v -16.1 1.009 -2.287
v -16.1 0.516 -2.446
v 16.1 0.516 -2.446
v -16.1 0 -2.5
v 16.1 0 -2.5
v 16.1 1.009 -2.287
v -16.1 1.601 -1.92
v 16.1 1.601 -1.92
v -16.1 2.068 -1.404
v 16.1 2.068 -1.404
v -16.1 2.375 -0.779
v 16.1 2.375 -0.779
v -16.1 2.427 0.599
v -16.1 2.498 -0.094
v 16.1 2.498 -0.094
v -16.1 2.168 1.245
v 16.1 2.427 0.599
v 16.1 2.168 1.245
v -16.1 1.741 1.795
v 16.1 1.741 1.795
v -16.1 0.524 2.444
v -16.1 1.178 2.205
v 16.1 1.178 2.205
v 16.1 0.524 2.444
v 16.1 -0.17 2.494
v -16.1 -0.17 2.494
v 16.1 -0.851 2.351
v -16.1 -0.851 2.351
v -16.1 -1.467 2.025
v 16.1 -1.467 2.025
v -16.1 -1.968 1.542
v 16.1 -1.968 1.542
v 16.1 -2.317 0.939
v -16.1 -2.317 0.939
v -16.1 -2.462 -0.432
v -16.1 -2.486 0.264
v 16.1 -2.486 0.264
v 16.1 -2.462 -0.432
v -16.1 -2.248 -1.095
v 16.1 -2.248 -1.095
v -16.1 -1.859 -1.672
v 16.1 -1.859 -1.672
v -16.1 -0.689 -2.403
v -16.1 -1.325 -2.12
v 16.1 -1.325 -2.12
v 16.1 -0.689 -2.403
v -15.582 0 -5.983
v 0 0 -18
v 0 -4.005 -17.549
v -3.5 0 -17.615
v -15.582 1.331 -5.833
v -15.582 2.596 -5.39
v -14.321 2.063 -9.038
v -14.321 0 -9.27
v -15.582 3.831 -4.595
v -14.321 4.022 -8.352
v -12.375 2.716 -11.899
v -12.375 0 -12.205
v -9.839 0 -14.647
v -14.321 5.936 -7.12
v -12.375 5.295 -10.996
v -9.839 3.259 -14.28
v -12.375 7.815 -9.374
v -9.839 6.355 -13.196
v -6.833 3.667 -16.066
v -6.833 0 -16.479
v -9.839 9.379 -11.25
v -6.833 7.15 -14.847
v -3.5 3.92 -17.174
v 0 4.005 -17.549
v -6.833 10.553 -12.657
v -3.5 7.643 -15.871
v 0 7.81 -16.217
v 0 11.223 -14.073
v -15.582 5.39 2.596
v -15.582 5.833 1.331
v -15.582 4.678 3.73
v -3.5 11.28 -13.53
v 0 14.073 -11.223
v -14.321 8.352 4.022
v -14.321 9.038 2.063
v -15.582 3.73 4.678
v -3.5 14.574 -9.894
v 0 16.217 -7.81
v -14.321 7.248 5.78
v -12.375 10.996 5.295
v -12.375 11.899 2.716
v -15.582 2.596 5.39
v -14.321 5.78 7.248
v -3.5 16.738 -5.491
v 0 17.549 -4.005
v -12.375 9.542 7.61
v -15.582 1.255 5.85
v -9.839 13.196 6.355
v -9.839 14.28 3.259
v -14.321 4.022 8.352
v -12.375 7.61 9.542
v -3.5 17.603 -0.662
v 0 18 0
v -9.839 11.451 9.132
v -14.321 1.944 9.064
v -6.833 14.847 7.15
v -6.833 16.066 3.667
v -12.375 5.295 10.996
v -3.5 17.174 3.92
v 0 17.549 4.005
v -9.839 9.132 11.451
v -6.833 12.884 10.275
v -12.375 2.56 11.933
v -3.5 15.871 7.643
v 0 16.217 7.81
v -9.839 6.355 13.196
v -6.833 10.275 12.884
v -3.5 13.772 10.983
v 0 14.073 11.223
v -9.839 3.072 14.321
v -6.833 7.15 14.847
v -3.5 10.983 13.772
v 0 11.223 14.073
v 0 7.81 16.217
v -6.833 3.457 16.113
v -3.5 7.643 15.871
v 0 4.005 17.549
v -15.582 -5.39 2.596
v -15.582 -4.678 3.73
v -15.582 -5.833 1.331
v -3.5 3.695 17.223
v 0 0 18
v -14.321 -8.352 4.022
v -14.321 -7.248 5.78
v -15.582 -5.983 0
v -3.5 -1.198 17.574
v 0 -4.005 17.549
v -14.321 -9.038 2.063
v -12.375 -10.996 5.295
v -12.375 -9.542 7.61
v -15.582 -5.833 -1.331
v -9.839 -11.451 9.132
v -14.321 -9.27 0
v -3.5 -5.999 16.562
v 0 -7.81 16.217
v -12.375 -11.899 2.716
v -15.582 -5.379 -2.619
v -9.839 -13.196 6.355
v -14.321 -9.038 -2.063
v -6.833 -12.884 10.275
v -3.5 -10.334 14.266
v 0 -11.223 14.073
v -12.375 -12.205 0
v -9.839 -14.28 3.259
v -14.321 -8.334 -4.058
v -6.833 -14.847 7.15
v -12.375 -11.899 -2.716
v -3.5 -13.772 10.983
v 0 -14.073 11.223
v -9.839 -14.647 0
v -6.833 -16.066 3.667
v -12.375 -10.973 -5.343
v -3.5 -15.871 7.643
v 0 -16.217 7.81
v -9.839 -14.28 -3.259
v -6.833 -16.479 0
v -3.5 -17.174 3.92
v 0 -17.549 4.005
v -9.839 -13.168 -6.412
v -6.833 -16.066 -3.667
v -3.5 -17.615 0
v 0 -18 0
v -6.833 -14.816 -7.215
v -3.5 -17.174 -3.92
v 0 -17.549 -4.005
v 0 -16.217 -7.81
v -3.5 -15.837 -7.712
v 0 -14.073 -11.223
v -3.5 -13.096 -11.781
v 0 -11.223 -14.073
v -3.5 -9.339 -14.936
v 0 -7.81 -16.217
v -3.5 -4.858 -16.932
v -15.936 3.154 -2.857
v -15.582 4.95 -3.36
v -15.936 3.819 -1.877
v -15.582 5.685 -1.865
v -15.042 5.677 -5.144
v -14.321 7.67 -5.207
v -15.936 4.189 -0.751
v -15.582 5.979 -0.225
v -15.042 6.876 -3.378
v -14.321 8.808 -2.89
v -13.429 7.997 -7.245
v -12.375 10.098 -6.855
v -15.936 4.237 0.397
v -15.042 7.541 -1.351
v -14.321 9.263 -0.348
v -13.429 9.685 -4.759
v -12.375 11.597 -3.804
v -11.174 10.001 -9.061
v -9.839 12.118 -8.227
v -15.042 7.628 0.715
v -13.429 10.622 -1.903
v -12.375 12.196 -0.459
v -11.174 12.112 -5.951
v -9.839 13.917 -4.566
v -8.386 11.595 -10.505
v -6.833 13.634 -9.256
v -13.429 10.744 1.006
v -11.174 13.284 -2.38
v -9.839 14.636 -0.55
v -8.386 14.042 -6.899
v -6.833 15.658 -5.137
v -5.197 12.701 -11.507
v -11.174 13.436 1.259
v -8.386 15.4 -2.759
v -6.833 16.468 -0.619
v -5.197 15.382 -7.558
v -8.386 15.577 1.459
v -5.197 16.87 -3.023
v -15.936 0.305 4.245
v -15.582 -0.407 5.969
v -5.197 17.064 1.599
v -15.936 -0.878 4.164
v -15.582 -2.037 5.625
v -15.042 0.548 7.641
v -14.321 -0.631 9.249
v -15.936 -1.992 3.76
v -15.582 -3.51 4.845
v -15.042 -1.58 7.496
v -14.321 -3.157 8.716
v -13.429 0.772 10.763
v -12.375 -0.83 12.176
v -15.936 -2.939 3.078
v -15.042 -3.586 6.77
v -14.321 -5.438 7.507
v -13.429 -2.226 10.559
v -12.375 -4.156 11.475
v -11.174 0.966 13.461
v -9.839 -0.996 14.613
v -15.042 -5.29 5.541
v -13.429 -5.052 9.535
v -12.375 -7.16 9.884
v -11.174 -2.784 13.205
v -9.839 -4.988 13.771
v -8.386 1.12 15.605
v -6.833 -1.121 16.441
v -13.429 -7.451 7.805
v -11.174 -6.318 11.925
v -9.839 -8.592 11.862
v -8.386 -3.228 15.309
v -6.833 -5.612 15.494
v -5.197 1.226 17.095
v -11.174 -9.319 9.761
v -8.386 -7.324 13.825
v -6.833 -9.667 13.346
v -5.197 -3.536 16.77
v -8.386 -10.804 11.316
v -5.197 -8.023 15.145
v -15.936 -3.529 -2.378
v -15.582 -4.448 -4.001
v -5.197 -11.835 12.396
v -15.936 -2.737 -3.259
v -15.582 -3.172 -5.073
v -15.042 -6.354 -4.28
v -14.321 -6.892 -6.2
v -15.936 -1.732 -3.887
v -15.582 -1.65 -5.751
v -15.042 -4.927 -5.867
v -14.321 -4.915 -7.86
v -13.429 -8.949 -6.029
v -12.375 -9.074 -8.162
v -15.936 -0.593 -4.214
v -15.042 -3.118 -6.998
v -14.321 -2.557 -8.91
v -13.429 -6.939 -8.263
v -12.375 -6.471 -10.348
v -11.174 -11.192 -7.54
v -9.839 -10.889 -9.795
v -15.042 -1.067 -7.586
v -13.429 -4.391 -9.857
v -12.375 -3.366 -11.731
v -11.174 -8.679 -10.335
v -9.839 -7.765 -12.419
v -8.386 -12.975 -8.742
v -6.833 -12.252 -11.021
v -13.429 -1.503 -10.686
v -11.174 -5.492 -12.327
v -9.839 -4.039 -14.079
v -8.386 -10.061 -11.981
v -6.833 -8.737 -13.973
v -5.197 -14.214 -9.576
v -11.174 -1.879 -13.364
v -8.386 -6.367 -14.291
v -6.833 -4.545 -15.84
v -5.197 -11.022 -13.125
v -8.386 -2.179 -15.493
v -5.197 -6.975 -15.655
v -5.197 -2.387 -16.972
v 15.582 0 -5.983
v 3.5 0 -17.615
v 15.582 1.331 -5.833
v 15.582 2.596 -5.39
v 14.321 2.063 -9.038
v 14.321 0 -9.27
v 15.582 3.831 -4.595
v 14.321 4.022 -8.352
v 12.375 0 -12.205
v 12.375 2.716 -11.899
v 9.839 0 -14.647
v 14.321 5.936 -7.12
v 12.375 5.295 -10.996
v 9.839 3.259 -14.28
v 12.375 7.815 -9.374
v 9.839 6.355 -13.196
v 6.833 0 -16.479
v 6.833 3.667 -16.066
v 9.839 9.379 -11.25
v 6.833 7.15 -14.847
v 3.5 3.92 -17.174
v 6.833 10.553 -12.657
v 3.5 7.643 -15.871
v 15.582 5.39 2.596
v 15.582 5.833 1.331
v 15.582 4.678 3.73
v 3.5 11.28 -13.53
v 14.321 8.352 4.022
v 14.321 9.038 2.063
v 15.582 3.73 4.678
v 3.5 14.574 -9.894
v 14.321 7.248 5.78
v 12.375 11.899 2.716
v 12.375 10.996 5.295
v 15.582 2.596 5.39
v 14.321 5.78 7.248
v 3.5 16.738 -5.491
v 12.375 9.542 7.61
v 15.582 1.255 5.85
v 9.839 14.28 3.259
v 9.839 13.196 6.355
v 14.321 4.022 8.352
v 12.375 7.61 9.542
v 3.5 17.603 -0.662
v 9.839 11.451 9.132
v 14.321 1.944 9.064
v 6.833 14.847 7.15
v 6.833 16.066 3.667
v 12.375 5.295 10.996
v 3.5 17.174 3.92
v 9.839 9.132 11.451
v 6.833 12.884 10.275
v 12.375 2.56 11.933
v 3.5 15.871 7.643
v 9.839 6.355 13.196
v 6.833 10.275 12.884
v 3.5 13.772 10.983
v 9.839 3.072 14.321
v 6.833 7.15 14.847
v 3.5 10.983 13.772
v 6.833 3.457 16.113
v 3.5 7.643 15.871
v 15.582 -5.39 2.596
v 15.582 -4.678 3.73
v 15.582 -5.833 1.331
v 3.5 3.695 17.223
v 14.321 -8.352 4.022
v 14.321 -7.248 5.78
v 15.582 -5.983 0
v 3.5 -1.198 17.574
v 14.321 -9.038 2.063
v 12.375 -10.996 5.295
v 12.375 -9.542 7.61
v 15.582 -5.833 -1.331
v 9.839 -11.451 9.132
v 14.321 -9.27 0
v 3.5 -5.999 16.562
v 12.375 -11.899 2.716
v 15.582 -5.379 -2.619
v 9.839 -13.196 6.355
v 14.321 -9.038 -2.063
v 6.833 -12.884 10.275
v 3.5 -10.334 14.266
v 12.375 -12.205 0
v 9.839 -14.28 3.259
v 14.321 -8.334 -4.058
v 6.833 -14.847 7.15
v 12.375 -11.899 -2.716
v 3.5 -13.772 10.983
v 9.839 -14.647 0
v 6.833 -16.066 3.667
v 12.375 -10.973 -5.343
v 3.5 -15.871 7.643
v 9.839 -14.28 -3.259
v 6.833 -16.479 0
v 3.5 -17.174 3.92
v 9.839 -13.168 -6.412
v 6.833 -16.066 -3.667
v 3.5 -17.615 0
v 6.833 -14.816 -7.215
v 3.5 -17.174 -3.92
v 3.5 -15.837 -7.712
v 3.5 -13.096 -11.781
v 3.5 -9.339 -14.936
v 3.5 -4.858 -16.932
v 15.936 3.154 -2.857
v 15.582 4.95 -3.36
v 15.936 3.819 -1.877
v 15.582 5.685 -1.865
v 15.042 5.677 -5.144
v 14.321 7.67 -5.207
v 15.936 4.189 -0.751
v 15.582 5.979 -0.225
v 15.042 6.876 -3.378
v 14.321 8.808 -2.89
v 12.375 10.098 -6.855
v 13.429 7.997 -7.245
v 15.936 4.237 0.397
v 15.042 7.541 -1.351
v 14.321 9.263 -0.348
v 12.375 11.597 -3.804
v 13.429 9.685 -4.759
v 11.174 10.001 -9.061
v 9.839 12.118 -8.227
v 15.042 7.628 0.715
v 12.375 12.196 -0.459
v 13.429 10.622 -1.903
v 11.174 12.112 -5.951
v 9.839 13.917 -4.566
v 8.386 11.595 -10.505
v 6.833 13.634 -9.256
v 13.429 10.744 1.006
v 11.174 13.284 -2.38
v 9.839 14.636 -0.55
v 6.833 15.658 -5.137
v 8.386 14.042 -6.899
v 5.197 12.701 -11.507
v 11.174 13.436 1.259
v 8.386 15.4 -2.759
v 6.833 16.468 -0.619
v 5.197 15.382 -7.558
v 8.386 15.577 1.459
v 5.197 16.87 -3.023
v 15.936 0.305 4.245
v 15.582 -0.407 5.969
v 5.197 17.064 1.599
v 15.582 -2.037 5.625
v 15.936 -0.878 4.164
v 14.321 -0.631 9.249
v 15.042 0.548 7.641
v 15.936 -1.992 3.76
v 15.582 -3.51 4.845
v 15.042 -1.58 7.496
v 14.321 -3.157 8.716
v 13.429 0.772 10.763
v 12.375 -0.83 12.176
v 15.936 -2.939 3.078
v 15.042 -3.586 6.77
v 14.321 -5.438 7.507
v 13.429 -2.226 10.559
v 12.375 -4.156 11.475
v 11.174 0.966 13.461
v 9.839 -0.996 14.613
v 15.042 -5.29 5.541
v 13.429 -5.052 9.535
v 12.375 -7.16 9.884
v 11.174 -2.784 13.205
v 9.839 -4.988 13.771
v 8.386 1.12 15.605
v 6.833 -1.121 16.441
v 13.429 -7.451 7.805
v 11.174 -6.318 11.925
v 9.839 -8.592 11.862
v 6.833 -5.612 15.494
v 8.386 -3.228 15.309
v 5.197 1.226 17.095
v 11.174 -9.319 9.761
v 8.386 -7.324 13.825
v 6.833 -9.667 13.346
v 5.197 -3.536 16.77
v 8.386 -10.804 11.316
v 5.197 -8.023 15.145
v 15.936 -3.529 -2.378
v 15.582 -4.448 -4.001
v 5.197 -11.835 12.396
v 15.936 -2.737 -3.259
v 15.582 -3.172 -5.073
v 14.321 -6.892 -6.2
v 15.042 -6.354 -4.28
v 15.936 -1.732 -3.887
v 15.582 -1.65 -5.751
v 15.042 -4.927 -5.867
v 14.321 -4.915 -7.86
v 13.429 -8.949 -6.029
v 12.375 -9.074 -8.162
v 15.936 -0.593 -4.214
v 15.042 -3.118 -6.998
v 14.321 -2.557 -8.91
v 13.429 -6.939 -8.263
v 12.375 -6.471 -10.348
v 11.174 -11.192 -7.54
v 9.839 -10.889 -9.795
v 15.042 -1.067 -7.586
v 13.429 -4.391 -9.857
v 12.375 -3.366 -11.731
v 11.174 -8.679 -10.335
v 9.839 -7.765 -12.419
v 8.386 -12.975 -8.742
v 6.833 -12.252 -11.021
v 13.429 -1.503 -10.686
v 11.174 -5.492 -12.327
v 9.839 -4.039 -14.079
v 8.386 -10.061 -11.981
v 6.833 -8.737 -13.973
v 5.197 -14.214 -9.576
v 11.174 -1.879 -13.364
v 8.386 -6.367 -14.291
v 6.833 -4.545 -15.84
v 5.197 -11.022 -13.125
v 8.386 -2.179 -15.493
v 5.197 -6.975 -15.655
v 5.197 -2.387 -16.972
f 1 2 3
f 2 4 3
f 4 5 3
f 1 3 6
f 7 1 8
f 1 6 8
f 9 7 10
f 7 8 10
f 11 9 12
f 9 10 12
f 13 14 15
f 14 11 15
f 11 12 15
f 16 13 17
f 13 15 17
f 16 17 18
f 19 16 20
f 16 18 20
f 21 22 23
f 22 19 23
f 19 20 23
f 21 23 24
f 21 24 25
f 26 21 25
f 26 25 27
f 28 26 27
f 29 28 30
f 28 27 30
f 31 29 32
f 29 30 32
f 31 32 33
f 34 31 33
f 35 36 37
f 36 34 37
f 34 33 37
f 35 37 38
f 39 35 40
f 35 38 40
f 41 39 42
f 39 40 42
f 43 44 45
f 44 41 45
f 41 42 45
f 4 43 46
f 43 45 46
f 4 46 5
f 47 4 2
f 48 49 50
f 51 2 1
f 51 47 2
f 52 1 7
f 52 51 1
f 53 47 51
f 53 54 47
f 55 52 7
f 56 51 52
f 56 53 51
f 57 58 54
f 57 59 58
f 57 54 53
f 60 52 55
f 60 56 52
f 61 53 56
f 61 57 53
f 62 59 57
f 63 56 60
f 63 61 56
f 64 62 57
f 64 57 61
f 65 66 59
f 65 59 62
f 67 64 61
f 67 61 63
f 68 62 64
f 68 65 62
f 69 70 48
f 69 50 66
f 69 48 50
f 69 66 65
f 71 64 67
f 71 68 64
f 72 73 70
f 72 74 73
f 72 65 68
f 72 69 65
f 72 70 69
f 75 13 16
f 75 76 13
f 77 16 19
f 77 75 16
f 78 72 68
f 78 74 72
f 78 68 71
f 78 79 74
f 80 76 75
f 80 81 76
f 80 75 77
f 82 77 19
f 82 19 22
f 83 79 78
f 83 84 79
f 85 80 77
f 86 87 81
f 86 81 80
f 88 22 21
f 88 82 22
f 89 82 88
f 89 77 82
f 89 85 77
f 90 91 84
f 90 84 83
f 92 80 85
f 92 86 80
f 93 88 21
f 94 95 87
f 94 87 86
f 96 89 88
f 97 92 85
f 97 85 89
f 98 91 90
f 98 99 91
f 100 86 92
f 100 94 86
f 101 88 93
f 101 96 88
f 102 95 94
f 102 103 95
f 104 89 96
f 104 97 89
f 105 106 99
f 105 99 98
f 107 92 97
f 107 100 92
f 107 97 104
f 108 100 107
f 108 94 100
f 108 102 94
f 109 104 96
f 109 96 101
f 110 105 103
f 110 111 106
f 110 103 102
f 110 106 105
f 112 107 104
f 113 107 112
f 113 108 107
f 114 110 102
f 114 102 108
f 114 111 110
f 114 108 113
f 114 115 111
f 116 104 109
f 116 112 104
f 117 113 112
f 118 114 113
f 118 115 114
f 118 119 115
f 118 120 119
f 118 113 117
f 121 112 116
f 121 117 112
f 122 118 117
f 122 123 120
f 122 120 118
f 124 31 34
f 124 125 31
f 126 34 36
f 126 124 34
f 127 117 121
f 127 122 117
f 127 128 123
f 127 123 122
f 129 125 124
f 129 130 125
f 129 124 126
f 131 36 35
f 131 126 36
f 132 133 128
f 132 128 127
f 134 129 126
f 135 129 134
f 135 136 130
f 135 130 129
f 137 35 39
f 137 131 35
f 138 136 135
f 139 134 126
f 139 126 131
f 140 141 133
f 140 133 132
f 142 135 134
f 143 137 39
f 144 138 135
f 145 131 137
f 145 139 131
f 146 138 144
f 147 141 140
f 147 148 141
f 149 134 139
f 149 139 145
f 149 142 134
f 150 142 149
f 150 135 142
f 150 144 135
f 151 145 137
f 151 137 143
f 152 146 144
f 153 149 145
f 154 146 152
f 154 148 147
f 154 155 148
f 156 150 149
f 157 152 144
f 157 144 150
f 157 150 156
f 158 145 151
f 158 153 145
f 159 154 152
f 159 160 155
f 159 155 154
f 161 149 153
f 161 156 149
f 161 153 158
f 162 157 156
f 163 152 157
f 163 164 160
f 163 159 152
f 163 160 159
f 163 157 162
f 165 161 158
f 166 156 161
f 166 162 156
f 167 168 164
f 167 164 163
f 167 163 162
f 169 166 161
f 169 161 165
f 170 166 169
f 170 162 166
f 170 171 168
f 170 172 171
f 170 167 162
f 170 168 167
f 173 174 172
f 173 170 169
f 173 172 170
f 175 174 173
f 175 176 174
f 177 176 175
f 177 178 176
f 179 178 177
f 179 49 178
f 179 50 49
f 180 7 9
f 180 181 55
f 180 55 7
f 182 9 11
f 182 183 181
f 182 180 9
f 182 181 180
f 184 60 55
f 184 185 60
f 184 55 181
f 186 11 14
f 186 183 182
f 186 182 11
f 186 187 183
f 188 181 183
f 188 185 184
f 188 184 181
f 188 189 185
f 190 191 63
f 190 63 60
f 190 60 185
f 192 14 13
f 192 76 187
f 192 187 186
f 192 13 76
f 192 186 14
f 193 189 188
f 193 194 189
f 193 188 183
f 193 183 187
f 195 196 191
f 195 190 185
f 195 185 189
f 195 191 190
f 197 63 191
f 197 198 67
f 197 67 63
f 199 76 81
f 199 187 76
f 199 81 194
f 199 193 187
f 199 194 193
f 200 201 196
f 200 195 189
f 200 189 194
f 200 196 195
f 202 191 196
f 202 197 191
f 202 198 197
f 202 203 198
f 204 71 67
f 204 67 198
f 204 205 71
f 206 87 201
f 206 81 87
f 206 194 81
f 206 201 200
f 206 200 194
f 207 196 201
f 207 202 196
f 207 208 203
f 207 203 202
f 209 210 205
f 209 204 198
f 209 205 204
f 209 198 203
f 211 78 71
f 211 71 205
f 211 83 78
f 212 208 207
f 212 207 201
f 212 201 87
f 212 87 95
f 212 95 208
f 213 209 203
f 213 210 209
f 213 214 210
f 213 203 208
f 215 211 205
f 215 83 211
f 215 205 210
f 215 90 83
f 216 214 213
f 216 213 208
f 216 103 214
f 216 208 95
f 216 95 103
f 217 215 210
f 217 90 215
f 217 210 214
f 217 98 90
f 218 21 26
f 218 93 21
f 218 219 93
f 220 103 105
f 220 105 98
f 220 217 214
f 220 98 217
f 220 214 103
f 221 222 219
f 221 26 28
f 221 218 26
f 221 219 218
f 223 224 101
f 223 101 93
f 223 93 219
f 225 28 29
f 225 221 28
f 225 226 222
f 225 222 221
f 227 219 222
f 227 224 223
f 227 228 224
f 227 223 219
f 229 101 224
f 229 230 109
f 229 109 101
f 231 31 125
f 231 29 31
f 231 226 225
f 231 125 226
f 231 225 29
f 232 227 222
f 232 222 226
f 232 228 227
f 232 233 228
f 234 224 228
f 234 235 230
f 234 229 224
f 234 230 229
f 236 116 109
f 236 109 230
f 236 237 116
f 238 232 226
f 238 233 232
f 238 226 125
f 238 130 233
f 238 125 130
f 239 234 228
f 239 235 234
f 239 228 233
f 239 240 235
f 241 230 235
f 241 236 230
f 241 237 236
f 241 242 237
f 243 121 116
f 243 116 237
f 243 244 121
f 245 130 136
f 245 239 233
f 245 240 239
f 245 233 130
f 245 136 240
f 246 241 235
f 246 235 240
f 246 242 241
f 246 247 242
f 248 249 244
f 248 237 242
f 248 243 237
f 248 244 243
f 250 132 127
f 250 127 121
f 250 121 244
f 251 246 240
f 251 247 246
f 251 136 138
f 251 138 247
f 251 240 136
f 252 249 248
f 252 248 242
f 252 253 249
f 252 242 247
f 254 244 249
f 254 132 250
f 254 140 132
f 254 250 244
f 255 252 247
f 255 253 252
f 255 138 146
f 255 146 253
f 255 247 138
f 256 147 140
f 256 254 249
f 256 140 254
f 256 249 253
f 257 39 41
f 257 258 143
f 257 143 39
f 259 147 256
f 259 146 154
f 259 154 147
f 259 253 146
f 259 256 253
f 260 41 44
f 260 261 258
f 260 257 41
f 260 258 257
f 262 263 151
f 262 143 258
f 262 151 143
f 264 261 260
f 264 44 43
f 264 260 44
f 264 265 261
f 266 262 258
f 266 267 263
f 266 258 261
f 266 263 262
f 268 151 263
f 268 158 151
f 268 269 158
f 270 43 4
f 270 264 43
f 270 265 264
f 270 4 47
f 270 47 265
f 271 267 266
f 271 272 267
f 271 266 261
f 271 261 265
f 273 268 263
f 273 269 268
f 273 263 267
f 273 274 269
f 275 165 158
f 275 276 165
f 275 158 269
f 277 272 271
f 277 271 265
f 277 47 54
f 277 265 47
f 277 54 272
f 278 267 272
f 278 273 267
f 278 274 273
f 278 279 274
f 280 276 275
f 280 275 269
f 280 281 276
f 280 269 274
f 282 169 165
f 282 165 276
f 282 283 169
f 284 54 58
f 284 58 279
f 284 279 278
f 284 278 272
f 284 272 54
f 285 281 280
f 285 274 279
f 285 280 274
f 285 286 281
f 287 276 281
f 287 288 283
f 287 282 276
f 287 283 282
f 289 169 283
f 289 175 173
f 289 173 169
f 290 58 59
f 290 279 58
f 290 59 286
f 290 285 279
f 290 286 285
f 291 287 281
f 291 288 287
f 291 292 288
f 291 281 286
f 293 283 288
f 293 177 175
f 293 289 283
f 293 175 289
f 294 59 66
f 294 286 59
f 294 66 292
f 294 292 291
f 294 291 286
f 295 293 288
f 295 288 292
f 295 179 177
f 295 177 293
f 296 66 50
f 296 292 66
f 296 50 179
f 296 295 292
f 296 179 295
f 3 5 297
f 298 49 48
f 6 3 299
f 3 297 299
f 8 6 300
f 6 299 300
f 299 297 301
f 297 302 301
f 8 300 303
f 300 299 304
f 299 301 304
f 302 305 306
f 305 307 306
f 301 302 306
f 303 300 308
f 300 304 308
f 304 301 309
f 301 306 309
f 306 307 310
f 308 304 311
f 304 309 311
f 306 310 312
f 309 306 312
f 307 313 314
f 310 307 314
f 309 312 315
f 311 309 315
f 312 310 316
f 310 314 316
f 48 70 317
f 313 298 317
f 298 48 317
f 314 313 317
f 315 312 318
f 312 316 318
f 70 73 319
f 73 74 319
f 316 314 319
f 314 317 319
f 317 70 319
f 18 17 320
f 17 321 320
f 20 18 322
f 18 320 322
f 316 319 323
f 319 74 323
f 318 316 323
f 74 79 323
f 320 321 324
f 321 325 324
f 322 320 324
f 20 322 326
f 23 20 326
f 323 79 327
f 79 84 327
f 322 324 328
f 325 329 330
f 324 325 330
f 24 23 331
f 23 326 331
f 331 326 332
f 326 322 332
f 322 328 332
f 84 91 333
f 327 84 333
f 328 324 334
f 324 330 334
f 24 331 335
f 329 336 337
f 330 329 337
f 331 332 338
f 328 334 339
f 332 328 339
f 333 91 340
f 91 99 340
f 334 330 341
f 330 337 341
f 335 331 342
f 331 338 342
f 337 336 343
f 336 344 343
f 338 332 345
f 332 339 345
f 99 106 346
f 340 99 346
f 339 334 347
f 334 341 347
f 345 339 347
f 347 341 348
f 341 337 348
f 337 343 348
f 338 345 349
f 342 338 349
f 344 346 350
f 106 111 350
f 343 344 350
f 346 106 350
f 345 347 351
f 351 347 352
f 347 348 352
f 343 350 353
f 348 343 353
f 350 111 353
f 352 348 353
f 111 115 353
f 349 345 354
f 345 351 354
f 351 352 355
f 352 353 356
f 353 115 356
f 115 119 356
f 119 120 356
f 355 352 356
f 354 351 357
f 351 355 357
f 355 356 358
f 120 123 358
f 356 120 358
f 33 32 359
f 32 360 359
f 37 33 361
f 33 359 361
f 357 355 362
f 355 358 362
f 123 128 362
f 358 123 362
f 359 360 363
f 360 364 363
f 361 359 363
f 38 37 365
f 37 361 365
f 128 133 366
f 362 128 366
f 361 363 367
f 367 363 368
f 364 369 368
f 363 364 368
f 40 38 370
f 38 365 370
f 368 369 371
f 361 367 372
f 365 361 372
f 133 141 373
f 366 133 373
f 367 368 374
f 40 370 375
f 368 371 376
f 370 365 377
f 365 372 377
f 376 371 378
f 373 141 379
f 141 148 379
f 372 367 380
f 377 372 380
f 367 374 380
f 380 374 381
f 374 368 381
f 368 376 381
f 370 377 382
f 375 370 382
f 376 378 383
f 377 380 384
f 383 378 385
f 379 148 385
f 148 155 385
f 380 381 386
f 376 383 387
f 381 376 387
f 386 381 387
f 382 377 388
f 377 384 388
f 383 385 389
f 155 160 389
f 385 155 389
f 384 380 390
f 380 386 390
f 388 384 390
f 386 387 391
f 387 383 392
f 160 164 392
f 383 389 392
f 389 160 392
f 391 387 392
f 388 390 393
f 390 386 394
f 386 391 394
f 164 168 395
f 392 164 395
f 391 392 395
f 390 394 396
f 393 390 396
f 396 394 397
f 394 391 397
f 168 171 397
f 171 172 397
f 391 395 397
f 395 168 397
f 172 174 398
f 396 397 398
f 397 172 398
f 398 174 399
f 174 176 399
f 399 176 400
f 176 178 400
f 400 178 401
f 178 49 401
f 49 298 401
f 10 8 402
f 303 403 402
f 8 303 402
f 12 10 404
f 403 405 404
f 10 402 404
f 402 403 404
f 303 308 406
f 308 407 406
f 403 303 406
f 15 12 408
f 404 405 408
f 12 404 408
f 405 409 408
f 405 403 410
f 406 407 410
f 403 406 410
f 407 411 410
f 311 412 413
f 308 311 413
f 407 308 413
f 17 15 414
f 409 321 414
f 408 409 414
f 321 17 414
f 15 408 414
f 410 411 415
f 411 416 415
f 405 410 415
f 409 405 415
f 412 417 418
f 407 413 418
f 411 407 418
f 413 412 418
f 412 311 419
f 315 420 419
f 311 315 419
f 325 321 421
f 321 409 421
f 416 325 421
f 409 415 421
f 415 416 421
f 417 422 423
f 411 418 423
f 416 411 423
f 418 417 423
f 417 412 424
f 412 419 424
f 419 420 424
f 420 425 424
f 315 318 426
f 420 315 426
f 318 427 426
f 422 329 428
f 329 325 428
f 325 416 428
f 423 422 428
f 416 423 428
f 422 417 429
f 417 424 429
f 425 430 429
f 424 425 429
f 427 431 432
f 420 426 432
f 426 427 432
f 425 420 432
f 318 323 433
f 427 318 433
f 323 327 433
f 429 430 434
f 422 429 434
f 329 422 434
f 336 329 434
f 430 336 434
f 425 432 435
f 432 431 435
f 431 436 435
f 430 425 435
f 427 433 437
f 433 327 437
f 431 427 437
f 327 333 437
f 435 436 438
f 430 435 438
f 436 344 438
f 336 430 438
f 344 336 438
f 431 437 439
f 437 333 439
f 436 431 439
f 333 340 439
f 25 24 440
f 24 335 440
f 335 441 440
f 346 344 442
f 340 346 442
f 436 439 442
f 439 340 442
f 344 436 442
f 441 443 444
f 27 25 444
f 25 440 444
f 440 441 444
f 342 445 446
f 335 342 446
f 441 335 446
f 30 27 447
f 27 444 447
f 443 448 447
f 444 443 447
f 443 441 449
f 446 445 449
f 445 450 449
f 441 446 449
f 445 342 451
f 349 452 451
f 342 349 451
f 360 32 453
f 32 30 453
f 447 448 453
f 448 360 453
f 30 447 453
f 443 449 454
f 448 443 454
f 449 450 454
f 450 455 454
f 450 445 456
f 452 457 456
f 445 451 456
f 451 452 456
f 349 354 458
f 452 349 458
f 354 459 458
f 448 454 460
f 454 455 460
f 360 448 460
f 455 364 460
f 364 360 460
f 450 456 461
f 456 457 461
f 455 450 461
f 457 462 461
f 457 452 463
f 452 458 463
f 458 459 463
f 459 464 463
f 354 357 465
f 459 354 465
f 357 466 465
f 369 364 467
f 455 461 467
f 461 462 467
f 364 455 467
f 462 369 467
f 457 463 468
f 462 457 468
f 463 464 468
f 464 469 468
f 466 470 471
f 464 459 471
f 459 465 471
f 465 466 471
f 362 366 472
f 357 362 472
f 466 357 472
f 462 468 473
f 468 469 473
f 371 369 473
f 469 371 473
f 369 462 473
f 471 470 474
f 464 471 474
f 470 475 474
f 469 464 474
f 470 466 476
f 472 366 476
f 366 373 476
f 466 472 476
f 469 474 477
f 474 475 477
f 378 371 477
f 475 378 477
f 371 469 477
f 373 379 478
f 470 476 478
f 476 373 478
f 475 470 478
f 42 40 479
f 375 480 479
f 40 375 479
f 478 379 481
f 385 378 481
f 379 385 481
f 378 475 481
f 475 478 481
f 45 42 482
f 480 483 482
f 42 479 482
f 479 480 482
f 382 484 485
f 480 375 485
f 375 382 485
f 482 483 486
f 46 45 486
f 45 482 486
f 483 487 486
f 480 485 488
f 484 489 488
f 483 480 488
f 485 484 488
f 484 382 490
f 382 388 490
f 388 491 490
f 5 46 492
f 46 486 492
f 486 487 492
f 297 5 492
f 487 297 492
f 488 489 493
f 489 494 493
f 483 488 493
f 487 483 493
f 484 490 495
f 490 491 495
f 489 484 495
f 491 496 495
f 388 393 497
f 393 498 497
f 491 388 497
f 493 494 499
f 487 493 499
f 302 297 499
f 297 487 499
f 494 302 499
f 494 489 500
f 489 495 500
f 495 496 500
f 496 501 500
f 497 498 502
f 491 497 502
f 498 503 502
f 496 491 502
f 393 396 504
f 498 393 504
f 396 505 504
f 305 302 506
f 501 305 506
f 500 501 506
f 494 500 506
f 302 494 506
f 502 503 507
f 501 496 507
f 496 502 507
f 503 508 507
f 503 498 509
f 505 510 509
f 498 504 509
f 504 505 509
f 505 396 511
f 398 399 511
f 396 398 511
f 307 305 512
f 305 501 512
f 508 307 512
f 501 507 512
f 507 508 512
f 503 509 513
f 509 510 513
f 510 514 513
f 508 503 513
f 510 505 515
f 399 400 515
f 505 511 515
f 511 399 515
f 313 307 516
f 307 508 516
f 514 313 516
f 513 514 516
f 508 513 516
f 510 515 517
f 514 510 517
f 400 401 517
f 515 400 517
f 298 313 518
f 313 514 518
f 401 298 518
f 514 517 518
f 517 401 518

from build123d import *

# Parameters (mm, degrees)
SKETCH2_R               = 2.5
CUT_EXTRUDE1_DEPTH      = 27
CUT_EXTRUDE1_DEPTH_BACK = 26


with BuildPart() as part:
    # Sketch1 → Revolve1 (revolve)
    with BuildSketch(Plane(origin=(0, 0, 0), x_dir=(1, 0, 0), z_dir=(0, 1, 0))):
        with BuildLine():
            Line((0, 0), (16, 0))
            ThreePointArc((16, 0), (12.041594579, 12.592528514), (0, 18))
            Line((0, 18), (0, 0))
        make_face()
    revolve1 = revolve(axis=Axis((0, 0, 0), (1, 0, 0)))

    # Mirror2: Revolve1 across plane
    add(revolve1.mirror(Plane(origin=(0, 0, 0), x_dir=(0, 0, 1), z_dir=(1, 0, 0))))

    # Sketch2 → Cut-Extrude1 (cut, two sides)
    with BuildSketch(Plane(origin=(0, 0, 0), x_dir=(0, 0, -1), z_dir=(1, 0, 0))) as cut_extrude1_sk:
        Circle(SKETCH2_R)
    extrude(amount=CUT_EXTRUDE1_DEPTH, mode=Mode.SUBTRACT)
    extrude(cut_extrude1_sk.sketch, amount=-CUT_EXTRUDE1_DEPTH_BACK, mode=Mode.SUBTRACT)


solid = part.part
